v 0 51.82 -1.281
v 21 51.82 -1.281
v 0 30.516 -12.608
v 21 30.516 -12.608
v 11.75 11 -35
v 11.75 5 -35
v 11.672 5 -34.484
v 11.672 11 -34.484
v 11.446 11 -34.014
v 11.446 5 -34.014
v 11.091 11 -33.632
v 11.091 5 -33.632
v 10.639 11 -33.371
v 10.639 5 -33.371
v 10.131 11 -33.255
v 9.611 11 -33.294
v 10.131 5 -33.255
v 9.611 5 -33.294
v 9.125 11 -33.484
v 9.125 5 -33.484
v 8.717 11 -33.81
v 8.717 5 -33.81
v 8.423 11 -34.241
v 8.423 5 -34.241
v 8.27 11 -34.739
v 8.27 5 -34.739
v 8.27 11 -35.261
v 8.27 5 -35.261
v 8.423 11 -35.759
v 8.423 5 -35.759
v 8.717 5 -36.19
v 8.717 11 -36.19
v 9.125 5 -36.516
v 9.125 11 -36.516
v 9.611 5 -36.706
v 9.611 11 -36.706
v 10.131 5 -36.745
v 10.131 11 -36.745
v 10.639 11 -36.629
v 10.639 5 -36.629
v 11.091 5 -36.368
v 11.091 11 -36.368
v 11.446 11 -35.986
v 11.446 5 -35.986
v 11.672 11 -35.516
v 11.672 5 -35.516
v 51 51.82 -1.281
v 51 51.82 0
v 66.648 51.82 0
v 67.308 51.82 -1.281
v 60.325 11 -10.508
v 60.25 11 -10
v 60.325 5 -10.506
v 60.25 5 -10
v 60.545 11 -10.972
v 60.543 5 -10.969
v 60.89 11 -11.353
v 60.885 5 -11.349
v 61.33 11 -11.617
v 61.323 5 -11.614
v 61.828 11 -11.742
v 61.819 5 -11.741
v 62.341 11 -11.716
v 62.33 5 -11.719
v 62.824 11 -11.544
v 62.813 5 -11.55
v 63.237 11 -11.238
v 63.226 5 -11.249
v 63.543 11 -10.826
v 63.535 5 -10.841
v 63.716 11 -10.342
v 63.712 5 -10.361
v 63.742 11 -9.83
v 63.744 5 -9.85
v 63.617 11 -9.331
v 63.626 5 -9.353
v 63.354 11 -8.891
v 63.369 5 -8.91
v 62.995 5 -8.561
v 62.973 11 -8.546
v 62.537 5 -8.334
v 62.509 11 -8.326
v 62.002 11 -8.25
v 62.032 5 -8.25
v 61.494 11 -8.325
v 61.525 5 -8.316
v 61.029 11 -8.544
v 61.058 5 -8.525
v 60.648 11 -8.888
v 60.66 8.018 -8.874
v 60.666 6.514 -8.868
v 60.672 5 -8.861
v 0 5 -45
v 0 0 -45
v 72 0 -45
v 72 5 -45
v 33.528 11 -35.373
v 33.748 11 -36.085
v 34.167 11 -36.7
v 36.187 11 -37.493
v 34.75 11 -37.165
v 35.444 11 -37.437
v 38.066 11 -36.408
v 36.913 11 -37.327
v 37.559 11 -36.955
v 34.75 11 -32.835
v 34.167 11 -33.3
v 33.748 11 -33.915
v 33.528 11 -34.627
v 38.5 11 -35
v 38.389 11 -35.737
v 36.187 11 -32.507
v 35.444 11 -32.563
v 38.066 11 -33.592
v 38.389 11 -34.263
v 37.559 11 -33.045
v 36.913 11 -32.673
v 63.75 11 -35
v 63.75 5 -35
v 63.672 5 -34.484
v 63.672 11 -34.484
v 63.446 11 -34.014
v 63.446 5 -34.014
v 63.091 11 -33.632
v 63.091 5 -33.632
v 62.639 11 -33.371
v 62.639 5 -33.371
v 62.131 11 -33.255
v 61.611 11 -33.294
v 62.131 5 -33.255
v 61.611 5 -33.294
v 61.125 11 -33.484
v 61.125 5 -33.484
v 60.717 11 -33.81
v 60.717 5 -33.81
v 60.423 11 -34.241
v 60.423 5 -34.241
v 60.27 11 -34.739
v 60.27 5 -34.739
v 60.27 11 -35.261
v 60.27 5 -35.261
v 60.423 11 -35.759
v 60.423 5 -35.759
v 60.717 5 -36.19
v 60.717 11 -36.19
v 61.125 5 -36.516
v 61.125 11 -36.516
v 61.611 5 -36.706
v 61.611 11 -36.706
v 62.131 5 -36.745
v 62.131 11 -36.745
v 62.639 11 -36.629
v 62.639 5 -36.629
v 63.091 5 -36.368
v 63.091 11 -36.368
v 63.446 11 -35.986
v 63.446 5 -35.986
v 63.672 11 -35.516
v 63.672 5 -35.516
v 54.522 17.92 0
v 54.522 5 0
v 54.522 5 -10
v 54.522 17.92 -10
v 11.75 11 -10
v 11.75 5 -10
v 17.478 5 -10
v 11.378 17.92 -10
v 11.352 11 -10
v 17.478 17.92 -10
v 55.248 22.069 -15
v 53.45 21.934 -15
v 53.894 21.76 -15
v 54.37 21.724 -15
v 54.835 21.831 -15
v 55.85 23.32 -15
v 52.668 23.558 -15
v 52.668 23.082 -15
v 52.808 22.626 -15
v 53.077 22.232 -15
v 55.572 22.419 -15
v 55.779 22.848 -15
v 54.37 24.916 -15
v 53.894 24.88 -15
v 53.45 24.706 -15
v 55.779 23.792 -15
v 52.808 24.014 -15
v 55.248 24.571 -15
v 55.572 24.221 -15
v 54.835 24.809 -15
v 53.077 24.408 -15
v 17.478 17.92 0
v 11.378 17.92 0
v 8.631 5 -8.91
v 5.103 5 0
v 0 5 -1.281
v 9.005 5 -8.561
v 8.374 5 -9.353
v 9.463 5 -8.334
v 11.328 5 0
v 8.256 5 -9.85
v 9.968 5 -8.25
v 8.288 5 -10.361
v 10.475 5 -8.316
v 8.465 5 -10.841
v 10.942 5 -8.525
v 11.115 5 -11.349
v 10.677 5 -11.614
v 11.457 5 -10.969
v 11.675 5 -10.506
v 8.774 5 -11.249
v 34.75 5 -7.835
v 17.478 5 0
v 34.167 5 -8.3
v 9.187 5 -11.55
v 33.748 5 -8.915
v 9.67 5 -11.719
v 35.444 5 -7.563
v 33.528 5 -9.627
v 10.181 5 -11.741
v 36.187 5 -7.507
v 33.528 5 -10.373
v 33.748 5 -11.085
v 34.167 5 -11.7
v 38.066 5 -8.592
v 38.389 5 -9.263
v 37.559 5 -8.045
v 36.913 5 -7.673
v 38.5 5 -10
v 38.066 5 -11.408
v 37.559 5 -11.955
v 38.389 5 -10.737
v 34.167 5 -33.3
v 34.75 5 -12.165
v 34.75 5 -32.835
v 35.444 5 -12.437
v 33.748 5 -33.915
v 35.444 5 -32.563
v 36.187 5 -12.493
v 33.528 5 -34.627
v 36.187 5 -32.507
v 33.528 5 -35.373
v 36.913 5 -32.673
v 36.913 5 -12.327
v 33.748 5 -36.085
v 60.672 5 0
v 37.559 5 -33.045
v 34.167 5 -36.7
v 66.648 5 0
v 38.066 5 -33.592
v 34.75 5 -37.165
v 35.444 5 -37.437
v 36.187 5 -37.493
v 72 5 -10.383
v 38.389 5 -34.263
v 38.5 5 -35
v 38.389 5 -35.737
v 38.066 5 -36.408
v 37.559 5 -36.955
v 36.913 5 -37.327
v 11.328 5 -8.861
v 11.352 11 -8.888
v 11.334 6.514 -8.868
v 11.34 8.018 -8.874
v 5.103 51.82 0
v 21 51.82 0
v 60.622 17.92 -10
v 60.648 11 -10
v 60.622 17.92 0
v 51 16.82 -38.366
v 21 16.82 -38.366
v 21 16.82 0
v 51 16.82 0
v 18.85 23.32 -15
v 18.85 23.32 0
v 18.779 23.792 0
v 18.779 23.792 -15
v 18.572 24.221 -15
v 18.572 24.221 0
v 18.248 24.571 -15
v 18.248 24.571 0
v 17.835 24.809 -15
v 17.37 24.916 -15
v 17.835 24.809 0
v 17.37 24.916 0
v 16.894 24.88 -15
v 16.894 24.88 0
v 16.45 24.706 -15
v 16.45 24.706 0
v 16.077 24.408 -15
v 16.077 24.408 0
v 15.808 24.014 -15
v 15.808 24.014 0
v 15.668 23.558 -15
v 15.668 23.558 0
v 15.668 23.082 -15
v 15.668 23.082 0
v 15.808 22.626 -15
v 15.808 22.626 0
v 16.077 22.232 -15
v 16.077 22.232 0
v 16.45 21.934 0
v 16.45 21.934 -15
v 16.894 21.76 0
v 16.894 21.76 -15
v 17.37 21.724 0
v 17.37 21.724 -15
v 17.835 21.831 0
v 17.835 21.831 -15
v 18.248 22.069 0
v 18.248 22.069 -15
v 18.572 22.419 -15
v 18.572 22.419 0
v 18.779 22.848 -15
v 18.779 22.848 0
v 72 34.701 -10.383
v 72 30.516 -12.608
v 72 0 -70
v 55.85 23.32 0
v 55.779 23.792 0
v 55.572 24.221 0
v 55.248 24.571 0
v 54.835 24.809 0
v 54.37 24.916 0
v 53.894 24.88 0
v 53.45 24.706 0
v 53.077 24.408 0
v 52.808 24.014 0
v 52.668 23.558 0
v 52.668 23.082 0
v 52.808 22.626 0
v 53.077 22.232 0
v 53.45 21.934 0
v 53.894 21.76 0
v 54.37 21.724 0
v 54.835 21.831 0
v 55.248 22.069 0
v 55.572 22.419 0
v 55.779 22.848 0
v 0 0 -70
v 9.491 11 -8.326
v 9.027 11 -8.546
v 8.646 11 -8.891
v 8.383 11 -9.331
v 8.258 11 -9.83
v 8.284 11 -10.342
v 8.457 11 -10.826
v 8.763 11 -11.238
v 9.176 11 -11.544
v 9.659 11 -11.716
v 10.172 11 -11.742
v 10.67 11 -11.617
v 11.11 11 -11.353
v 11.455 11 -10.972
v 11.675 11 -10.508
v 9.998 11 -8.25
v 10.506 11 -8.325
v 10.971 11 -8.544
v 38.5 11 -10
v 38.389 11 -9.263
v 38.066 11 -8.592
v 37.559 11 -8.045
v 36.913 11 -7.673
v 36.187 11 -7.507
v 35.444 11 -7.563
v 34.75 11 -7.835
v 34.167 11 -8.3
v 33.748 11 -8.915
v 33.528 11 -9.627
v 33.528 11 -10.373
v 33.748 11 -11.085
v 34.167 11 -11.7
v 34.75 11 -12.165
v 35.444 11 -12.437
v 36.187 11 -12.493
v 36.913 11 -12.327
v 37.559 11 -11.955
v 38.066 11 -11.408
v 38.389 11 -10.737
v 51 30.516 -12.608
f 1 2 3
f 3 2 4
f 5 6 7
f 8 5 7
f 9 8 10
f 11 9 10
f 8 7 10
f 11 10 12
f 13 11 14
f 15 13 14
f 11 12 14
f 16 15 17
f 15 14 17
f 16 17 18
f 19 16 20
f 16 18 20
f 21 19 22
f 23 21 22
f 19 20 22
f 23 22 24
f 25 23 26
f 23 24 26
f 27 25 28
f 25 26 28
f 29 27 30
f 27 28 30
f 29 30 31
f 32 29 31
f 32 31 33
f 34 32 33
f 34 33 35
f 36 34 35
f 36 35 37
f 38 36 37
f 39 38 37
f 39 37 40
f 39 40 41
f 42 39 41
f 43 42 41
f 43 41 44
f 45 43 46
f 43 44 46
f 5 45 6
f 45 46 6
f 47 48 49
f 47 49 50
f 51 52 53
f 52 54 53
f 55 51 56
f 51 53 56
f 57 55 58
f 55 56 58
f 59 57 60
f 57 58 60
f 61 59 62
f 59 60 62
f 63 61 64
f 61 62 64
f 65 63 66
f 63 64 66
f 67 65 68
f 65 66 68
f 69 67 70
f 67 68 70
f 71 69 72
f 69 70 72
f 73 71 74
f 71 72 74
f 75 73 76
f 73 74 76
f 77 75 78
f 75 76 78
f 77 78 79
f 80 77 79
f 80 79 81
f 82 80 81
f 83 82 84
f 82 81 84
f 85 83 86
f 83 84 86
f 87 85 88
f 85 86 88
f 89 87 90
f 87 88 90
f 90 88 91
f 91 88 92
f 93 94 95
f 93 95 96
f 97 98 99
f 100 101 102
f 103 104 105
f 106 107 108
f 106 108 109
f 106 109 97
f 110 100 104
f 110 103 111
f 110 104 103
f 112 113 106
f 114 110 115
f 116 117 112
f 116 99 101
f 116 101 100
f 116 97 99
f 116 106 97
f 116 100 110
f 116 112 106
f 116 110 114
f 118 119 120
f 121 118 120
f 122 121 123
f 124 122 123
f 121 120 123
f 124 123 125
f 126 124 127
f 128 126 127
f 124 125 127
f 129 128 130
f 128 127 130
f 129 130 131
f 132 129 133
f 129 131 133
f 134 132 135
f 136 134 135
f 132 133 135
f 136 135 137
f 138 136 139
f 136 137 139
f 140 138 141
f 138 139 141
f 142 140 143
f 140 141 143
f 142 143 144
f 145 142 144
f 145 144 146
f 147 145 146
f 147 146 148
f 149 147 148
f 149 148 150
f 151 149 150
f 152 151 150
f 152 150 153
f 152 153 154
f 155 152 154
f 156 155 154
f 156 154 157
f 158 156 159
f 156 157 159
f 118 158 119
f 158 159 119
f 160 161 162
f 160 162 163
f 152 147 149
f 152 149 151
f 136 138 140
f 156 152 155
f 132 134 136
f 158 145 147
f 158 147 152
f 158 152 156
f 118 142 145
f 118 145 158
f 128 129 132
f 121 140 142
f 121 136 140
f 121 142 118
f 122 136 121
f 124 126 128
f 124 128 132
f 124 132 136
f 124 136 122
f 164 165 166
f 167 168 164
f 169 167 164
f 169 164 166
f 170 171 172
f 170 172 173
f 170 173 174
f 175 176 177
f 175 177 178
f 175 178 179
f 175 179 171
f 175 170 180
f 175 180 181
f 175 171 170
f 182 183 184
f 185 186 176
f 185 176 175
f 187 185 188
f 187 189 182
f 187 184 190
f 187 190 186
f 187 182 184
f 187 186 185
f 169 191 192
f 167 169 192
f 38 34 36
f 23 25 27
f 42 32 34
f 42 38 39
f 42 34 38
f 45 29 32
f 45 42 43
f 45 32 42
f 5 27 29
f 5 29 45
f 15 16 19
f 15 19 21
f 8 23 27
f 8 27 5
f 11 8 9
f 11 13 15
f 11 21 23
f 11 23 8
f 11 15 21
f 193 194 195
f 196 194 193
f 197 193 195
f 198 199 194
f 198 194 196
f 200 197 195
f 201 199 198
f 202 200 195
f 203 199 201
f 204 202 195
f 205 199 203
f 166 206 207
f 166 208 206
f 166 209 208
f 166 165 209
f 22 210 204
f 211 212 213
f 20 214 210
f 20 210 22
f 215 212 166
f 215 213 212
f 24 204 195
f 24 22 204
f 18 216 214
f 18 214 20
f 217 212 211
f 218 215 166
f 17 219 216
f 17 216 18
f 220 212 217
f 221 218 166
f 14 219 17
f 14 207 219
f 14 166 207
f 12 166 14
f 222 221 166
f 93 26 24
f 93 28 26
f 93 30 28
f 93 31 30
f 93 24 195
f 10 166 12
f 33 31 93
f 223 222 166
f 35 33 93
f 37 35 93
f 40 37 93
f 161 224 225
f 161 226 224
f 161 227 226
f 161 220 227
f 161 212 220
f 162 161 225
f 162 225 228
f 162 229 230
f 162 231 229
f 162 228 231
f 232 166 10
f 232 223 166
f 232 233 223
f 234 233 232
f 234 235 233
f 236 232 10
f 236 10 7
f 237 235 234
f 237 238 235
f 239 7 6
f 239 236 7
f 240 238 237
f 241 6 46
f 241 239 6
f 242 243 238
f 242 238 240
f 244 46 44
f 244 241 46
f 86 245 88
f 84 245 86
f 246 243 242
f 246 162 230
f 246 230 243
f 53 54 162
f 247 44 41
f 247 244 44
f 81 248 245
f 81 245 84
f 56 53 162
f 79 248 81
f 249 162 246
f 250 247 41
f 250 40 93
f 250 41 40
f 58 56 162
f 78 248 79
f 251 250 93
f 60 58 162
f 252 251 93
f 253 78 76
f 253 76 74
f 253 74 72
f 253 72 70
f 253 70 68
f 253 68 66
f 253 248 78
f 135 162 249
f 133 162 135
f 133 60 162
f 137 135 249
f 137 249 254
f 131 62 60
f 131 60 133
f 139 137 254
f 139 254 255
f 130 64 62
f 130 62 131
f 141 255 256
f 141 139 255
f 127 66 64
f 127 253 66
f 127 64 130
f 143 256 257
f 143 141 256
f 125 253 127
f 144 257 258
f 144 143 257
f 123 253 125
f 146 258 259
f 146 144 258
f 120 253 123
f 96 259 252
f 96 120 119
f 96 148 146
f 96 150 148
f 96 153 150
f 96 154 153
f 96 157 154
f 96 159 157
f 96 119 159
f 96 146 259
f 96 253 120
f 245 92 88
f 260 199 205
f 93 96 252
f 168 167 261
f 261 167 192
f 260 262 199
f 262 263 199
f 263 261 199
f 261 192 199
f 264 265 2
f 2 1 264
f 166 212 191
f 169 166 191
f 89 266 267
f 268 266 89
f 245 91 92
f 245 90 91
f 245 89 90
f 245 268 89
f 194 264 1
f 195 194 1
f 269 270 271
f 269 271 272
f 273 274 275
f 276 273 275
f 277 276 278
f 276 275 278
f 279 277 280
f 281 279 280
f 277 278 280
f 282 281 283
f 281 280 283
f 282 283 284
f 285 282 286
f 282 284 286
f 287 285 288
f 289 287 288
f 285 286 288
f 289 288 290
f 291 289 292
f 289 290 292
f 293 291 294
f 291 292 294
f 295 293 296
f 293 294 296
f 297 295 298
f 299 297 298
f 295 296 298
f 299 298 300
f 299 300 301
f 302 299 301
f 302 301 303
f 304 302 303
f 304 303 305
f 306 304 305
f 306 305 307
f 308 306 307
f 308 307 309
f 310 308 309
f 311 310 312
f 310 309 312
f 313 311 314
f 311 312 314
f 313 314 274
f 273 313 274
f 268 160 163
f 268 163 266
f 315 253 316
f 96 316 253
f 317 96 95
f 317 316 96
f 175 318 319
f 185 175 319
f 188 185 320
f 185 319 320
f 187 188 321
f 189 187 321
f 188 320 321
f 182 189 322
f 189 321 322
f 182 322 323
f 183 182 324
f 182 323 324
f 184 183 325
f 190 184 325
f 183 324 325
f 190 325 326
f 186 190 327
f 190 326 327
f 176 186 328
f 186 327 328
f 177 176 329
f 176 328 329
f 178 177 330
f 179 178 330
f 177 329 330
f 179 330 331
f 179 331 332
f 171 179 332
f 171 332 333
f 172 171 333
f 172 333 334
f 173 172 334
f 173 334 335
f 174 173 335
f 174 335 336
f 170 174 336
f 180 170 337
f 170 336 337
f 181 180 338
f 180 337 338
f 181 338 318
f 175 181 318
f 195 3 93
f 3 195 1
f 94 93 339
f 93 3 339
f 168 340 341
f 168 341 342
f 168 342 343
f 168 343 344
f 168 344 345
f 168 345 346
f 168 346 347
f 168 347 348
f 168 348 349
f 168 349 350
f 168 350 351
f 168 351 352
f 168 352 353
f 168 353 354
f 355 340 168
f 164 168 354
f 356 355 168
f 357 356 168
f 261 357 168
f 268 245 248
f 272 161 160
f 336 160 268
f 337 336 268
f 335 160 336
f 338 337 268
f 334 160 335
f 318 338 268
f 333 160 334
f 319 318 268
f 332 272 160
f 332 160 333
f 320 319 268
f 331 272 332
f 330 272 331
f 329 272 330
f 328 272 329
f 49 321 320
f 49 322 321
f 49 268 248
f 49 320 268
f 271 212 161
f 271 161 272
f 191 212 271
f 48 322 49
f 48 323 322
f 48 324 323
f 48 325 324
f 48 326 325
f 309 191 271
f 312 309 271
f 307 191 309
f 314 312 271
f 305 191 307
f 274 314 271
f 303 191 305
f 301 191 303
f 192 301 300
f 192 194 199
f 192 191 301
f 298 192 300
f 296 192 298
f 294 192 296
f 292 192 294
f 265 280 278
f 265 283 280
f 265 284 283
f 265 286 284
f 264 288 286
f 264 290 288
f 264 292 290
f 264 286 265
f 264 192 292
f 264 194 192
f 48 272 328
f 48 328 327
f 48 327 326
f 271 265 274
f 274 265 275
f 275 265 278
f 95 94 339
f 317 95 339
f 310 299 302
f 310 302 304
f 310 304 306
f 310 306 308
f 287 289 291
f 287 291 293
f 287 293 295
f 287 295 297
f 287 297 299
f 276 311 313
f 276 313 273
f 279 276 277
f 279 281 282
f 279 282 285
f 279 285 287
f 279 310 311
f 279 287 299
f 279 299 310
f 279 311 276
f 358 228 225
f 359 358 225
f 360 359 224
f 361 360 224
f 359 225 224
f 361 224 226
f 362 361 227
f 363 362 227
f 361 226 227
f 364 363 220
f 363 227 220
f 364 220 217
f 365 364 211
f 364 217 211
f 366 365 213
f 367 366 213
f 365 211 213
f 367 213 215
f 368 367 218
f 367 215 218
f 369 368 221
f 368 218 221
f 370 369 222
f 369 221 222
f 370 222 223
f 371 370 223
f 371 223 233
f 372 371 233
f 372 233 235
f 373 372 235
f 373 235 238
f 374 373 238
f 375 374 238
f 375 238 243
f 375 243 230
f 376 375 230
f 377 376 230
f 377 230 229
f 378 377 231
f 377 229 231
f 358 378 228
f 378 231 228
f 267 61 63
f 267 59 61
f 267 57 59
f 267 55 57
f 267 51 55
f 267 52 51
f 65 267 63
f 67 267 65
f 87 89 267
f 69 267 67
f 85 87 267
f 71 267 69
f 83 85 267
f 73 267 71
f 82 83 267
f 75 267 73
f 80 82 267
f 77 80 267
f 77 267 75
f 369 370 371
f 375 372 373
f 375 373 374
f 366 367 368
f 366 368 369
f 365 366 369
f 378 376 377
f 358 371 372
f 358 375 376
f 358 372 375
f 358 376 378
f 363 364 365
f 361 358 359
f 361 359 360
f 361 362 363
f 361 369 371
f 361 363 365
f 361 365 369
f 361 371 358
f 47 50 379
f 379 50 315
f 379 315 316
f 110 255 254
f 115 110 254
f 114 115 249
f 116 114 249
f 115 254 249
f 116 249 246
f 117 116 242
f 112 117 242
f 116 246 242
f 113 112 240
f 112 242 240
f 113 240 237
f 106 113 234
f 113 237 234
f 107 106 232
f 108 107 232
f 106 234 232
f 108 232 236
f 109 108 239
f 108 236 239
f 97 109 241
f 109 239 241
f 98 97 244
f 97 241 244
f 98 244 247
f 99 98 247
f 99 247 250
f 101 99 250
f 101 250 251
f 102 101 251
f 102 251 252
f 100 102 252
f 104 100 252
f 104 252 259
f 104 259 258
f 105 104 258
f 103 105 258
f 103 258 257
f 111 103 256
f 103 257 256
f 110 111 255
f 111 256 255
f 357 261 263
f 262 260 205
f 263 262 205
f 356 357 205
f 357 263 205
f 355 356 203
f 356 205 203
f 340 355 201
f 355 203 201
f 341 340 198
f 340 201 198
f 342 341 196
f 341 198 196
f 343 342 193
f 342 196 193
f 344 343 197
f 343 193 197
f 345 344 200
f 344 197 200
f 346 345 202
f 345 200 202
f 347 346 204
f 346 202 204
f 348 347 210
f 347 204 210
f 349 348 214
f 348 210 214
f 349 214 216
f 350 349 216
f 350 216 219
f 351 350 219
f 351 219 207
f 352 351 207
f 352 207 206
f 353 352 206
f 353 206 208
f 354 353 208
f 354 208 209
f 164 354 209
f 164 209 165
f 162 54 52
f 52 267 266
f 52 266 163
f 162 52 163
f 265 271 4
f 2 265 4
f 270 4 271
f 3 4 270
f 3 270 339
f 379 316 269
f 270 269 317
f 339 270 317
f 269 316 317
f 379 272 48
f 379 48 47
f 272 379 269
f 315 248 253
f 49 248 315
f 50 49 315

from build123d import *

# Parameters (mm, degrees)
CROQUIS1_W              = 70
CROQUIS1_H              = 51.82
SALIENTE_EXTRUIR1_DEPTH = 72
CORTAR_EXTRUIR1_DEPTH   = 72
CROQUIS5_W              = 30
CROQUIS5_H              = 62
CORTAR_EXTRUIR2_DEPTH   = 35
CORTAR_EXTRUIR3_REACH   = 74
CROQUIS6_W              = 45
CROQUIS6_H              = 5
CORTAR_EXTRUIR4_REACH   = 53.82
CORTAR_EXTRUIR5_REACH   = 53.82
CROQUIS18_R             = 1.6
CORTAR_EXTRUIR7_DEPTH   = 15
CROQUIS19_R             = 1.75
CROQUIS19_R_2           = 2.5
CORTAR_EXTRUIR8_DEPTH   = 6
CORTAR_EXTRUIR10_DEPTH  = 10


with BuildPart() as part:
    # Croquis1 → Saliente-Extruir1 (new body)
    with BuildSketch(Plane(origin=(0, 0, 0), x_dir=(0, 0, -1), z_dir=(1, 0, 0))):
        with Locations((35, 25.91)):
            Rectangle(CROQUIS1_W, CROQUIS1_H)
    extrude(amount=SALIENTE_EXTRUIR1_DEPTH)

    # Croquis4 → Cortar-Extruir1 (cut)
    with BuildSketch(Plane(origin=(72, 0, 0), x_dir=(0, 0, -1), z_dir=(1, 0, 0))):
        Polygon((12.608406464, 30.515651581), (70, 0), (70, 51.82), (1.280683474, 51.82), align=None)
    extrude(amount=-CORTAR_EXTRUIR1_DEPTH, mode=Mode.SUBTRACT)

    # Croquis5 → Cortar-Extruir2 (cut)
    with BuildSketch(Plane(origin=(0, 51.82, 0), x_dir=(1, 0, 0), z_dir=(0, 1, 0))):
        with Locations((36, 31)):
            Rectangle(CROQUIS5_W, CROQUIS5_H)
    extrude(amount=-CORTAR_EXTRUIR2_DEPTH, mode=Mode.SUBTRACT)

    # Croquis6 → Cortar-Extruir3 (cut, up to next)
    with BuildSketch(Plane(origin=(72, 0, 0), x_dir=(0, 0, -1), z_dir=(1, 0, 0)), mode=Mode.PRIVATE) as cortar_extruir3_sk1:
        with Locations((22.5, 2.5)):
            Rectangle(CROQUIS6_W, CROQUIS6_H)
    cortar_extruir3_tool1 = extrude(cortar_extruir3_sk1.sketch, amount=-CORTAR_EXTRUIR3_REACH, mode=Mode.PRIVATE) & part.part
    add(cortar_extruir3_tool1.solids().sort_by_distance((72, 2.5, -22.5))[0], mode=Mode.SUBTRACT)

    # Croquis7 → Cortar-Extruir4 (cut, up to next)
    with BuildSketch(Plane(origin=(0, 51.82, 0), x_dir=(1, 0, 0), z_dir=(0, 1, 0)), mode=Mode.PRIVATE) as cortar_extruir4_sk1:
        Polygon((5.10343226, 0), (0, 1.280683474), (0, 0), align=None)
    cortar_extruir4_tool1 = extrude(cortar_extruir4_sk1.sketch, amount=-CORTAR_EXTRUIR4_REACH, mode=Mode.PRIVATE) & part.part
    add(cortar_extruir4_tool1.solids().sort_by_distance((1.701144, 51.82, -0.426894))[0], mode=Mode.SUBTRACT)

    # Croquis8 → Cortar-Extruir5 (cut, up to next)
    with BuildSketch(Plane(origin=(0, 51.82, 0), x_dir=(1, 0, 0), z_dir=(0, 1, 0)), mode=Mode.PRIVATE) as cortar_extruir5_sk1:
        Polygon((66.648328853, 0), (72, 10.382844773), (72, 0), align=None)
    cortar_extruir5_tool1 = extrude(cortar_extruir5_sk1.sketch, amount=-CORTAR_EXTRUIR5_REACH, mode=Mode.PRIVATE) & part.part
    add(cortar_extruir5_tool1.solids().sort_by_distance((70.21611, 51.82, -3.460948))[0], mode=Mode.SUBTRACT)

    # Croquis18 → Cortar-Extruir7 (cut)
    with BuildSketch(Plane.XY):
        with Locations((17.25, 23.32)):
            Circle(CROQUIS18_R)
        with Locations((54.25, 23.32)):
            Circle(CROQUIS18_R)
    extrude(amount=-CORTAR_EXTRUIR7_DEPTH, mode=Mode.SUBTRACT)

    # Croquis19 → Cortar-Extruir8 (cut)
    with BuildSketch(Plane.XZ.offset(-5)):
        with Locations((10, -35)):
            Circle(CROQUIS19_R)
        with Locations((10, -10)):
            Circle(CROQUIS19_R)
        with Locations((62, -35)):
            Circle(CROQUIS19_R)
        with Locations((62, -10)):
            Circle(CROQUIS19_R)
        with Locations((36, -35)):
            Circle(CROQUIS19_R_2)
        with Locations((36, -10)):
            Circle(CROQUIS19_R_2)
    extrude(amount=-CORTAR_EXTRUIR8_DEPTH, mode=Mode.SUBTRACT)

    # Croquis21 → Cortar-Extruir10 (cut)
    with BuildSketch(Plane.XY):
        Polygon((11.328328853, 5), (17.478328853, 5), (17.478328853, 17.92), (11.378328853, 17.92), align=None)
        Polygon((60.671671147, 5), (54.521671147, 5), (54.521671147, 17.92), (60.621671147, 17.92), align=None)
    extrude(amount=-CORTAR_EXTRUIR10_DEPTH, mode=Mode.SUBTRACT)


solid = part.part
